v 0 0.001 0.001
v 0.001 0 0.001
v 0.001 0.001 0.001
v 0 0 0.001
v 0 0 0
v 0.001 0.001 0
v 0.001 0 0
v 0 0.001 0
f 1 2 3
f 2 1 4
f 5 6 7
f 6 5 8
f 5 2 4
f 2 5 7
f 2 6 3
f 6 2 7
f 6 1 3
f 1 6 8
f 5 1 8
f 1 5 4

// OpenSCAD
// t_frame — roll policy. The requirement half_curvedPipe.scad discovered
// (docs/developer/history.md §2), now expressed as two policy strings.

// clang-format off
use <../src/uniTube.scad>;
// clang-format on

// A path with two bends in DIFFERENT planes -- the case where a naively derived
// frame spirals and a split seam would wander around the tube.
sp = ut_polyline([ [ 0, 0, 0 ], [ 40, 0, 0 ], [ 40, 40, 0 ], [ 40, 40, 40 ] ], r = 12);

// --- transport (default): rotation-minimizing -------------------------------
tr = ut_stations(sp, [[ "frame", "transport" ]]);
assert(max([for (s = tr) abs(ut_st_t(s) * ut_st_n(s))]) < 1e-9, "transport: n stays orthogonal to t");
assert(max([for (s = tr) abs(norm(ut_st_n(s)) - 1)]) < 1e-9, "transport: n stays unit");
// STATION-6: the frame never flips -- consecutive normals differ by < 90 deg.
assert(max([for (i = [0:len(tr) - 2]) ut_turn(ut_st_n(tr[i]), ut_st_n(tr[i + 1]))]) < 90,
       "STATION-6: continuous roll, no frame flip");

// --- fixed: the seam is pinned to a WORLD direction --------------------------
// Stronger than transport for a printable split conduit: transport only stops
// the seam spiralling relative to the TUBE, but a printed part has a
// gravity-relative requirement.
//
// THIS PATH IS NOT `sp`. `sp` finishes by running straight up, and a seam pinned
// to UP has no defined direction where the axis points along UP -- see below.
spf = ut_polyline([ [ 0, 0, 0 ], [ 40, 0, 0 ], [ 40, 40, 0 ], [ 70, 40, 25 ] ], r = 12);
fx = ut_stations(spf, [ [ "frame", "fixed" ], [ "normal", [ 0, 0, 1 ] ] ]);
assert(max([for (s = fx) abs(ut_st_t(s) * ut_st_n(s))]) < 1e-9, "fixed: n stays orthogonal to t");
// Every normal is UP projected into the station's plane, so on any station whose
// tangent is horizontal the normal is exactly UP.
horiz = [for (s = fx) if (abs(ut_st_t(s)[2]) < 1e-9) s];
assert(len(horiz) > 0, "expected some horizontal stations");
assert(max([for (s = horiz) norm(ut_st_n(s) - [ 0, 0, 1 ])]) < 1e-9, "fixed: horizontal stations point exactly UP");

// --- the vertical-tangent degeneracy -----------------------------------------
// THIS SECTION USED TO ASSERT THE WRONG PROPERTY, and that is how a 174-degree
// seam flip shipped in examples/05 for the whole life of the library.
//
// It ran `sp` -- whose final leg goes straight up -- through frame="fixed", and
// checked that the result was FINITE. It is finite: ut_ref_fallback() swaps UP
// for BACK when the tangent is parallel to UP, so nothing is NaN. But finite is
// not the requirement. The fallback is a hard switch, so applying it PER STATION
// makes it a DISCONTINUITY: the seam jumped 174 degrees in a single 6-degree
// step, the mesh stayed manifold, CGAL said Simple: yes, and every gate passed.
//
// The right answer is that the ask is undefined, not that it is finite. A
// vertical pipe has no upward-facing side. ut_stations() refuses it now, and
// tests/guards/g_fixed_vertical.scad is that refusal, watched to fire.
//
// ut_ref_fallback IS still correct for what it was written for: seeding a
// transport frame ONCE on a run that starts vertical. Used once there is no
// discontinuity to create, and that is what is asserted here.
vert = ut_stations(ut_polyline([ [ 0, 0, 0 ], [ 0, 0, 60 ] ]));
vn = ut_st_n(vert[0]);
assert(
    is_num(vn[0]) && is_num(vn[1]) && is_num(vn[2]),
    "transport: a run that STARTS vertical must not seed a NaN frame -- this killed the previous attempt's own example");
assert(abs(norm(vn) - 1) < 1e-9, "transport: the seeded normal is still a unit vector");
assert(abs(vn *ut_st_t(vert[0])) < 1e-9, "transport: and still orthogonal to a vertical tangent");

// --- an explicit per-station normal list --------------------------------------
// Again NOT `sp`: an all-UP list on a run that finishes vertical leaves nothing
// after projection, and ut_ortho() returned [nan, nan, nan] SILENTLY. The assert
// below is the one that was supposed to catch it and did not -- OpenSCAD's max()
// drops nan, so it measured 2.22e-16 on a frame list ending in nan and passed.
// Orthogonality is now checked per station with an explicit is_num, and
// ut_stations() refuses the degenerate list outright
// (tests/guards/g_frame_list_parallel.scad).
nf = len(ut_stations(spf));
manual = ut_stations(spf, [[ "frame", [for (i = [0:nf - 1])[0, 0, 1]] ]]);
assert(len(manual) == nf, "manual policy preserves station count");
assert(len([for (s = manual) if (!is_num(ut_st_n(s)[0]) || !is_num(ut_st_n(s)[1]) || !is_num(ut_st_n(s)[2])) 1]) == 0,
       "manual: no station frame may contain nan -- max() cannot see this, so count it instead");
assert(max([for (s = manual) abs(ut_st_t(s) * ut_st_n(s))]) < 1e-9, "manual: projected orthogonal to t");

// ============================================ STATION-6, now enforced
// "Continuous roll -- the frame never flips" was documented from Phase 1 and
// never checked. The measure is the roll step IN EXCESS of the tangent step:
// parallel transport turns the normal exactly as much as the tangent, so the
// excess is 0 by construction, and a fixed frame measures 0 to 1e-13.
function _excess(sts) = max([for (i = [1:len(sts) - 1]) ut_turn(ut_st_n(sts[i]), ut_st_n(sts[i - 1])) -
                             ut_turn(ut_st_t(sts[i]), ut_st_t(sts[i - 1]))]);

s6 = ut_polyline([ [ 0, 0, 0 ], [ 60, 0, 0 ], [ 60, 40, 0 ], [ 100, 40, 30 ] ], r = 18);
assert(_excess(ut_stations(s6)) < 1e-9, "STATION-6: transport never outruns the tangent");
assert(_excess(ut_stations(s6, [ [ "frame", "fixed" ], [ "normal", [ 0, 0, 1 ] ] ])) < 1e-9,
       str("STATION-6: a fixed frame away from its own axis is smooth, got ",
           _excess(ut_stations(s6, [ [ "frame", "fixed" ], [ "normal", [ 0, 0, 1 ] ] ]))));
// twist is DECLARED intent distributed by arclength, not a flip, and the check
// runs on the pre-twist normals so it cannot be tripped by asking for one.
assert(len(ut_stations(s6, [[ "twist", 720 ]])) > 2, "a large declared twist is not a flip");

// A fixed frame stays smooth right up to 1 degree from its own reference axis --
// the failure is a cliff AT the axis, not gradual ill-conditioning, which is why
// _ut_fixed_ok refuses only the genuinely undefined ask.
near = ut_polyline([ [ 0, 0, 0 ], [ 60, 0, 0 ], [ 61.05, 0, 60 ] ], r = 15);
assert(min([for (st = ut_stations(near, [ [ "frame", "fixed" ], [ "normal", [ 0, 0, 1 ] ] ]))
               let(a = ut_turn(ut_st_t(st), [ 0, 0, 1 ])) min(a, 180 - a)]) < 2,
       "this path really does come within 2 degrees of vertical");
assert(_excess(ut_stations(near, [ [ "frame", "fixed" ], [ "normal", [ 0, 0, 1 ] ] ])) < 1e-9,
       "and the fixed frame is still smooth there");

cube(0.001); // sentinel
